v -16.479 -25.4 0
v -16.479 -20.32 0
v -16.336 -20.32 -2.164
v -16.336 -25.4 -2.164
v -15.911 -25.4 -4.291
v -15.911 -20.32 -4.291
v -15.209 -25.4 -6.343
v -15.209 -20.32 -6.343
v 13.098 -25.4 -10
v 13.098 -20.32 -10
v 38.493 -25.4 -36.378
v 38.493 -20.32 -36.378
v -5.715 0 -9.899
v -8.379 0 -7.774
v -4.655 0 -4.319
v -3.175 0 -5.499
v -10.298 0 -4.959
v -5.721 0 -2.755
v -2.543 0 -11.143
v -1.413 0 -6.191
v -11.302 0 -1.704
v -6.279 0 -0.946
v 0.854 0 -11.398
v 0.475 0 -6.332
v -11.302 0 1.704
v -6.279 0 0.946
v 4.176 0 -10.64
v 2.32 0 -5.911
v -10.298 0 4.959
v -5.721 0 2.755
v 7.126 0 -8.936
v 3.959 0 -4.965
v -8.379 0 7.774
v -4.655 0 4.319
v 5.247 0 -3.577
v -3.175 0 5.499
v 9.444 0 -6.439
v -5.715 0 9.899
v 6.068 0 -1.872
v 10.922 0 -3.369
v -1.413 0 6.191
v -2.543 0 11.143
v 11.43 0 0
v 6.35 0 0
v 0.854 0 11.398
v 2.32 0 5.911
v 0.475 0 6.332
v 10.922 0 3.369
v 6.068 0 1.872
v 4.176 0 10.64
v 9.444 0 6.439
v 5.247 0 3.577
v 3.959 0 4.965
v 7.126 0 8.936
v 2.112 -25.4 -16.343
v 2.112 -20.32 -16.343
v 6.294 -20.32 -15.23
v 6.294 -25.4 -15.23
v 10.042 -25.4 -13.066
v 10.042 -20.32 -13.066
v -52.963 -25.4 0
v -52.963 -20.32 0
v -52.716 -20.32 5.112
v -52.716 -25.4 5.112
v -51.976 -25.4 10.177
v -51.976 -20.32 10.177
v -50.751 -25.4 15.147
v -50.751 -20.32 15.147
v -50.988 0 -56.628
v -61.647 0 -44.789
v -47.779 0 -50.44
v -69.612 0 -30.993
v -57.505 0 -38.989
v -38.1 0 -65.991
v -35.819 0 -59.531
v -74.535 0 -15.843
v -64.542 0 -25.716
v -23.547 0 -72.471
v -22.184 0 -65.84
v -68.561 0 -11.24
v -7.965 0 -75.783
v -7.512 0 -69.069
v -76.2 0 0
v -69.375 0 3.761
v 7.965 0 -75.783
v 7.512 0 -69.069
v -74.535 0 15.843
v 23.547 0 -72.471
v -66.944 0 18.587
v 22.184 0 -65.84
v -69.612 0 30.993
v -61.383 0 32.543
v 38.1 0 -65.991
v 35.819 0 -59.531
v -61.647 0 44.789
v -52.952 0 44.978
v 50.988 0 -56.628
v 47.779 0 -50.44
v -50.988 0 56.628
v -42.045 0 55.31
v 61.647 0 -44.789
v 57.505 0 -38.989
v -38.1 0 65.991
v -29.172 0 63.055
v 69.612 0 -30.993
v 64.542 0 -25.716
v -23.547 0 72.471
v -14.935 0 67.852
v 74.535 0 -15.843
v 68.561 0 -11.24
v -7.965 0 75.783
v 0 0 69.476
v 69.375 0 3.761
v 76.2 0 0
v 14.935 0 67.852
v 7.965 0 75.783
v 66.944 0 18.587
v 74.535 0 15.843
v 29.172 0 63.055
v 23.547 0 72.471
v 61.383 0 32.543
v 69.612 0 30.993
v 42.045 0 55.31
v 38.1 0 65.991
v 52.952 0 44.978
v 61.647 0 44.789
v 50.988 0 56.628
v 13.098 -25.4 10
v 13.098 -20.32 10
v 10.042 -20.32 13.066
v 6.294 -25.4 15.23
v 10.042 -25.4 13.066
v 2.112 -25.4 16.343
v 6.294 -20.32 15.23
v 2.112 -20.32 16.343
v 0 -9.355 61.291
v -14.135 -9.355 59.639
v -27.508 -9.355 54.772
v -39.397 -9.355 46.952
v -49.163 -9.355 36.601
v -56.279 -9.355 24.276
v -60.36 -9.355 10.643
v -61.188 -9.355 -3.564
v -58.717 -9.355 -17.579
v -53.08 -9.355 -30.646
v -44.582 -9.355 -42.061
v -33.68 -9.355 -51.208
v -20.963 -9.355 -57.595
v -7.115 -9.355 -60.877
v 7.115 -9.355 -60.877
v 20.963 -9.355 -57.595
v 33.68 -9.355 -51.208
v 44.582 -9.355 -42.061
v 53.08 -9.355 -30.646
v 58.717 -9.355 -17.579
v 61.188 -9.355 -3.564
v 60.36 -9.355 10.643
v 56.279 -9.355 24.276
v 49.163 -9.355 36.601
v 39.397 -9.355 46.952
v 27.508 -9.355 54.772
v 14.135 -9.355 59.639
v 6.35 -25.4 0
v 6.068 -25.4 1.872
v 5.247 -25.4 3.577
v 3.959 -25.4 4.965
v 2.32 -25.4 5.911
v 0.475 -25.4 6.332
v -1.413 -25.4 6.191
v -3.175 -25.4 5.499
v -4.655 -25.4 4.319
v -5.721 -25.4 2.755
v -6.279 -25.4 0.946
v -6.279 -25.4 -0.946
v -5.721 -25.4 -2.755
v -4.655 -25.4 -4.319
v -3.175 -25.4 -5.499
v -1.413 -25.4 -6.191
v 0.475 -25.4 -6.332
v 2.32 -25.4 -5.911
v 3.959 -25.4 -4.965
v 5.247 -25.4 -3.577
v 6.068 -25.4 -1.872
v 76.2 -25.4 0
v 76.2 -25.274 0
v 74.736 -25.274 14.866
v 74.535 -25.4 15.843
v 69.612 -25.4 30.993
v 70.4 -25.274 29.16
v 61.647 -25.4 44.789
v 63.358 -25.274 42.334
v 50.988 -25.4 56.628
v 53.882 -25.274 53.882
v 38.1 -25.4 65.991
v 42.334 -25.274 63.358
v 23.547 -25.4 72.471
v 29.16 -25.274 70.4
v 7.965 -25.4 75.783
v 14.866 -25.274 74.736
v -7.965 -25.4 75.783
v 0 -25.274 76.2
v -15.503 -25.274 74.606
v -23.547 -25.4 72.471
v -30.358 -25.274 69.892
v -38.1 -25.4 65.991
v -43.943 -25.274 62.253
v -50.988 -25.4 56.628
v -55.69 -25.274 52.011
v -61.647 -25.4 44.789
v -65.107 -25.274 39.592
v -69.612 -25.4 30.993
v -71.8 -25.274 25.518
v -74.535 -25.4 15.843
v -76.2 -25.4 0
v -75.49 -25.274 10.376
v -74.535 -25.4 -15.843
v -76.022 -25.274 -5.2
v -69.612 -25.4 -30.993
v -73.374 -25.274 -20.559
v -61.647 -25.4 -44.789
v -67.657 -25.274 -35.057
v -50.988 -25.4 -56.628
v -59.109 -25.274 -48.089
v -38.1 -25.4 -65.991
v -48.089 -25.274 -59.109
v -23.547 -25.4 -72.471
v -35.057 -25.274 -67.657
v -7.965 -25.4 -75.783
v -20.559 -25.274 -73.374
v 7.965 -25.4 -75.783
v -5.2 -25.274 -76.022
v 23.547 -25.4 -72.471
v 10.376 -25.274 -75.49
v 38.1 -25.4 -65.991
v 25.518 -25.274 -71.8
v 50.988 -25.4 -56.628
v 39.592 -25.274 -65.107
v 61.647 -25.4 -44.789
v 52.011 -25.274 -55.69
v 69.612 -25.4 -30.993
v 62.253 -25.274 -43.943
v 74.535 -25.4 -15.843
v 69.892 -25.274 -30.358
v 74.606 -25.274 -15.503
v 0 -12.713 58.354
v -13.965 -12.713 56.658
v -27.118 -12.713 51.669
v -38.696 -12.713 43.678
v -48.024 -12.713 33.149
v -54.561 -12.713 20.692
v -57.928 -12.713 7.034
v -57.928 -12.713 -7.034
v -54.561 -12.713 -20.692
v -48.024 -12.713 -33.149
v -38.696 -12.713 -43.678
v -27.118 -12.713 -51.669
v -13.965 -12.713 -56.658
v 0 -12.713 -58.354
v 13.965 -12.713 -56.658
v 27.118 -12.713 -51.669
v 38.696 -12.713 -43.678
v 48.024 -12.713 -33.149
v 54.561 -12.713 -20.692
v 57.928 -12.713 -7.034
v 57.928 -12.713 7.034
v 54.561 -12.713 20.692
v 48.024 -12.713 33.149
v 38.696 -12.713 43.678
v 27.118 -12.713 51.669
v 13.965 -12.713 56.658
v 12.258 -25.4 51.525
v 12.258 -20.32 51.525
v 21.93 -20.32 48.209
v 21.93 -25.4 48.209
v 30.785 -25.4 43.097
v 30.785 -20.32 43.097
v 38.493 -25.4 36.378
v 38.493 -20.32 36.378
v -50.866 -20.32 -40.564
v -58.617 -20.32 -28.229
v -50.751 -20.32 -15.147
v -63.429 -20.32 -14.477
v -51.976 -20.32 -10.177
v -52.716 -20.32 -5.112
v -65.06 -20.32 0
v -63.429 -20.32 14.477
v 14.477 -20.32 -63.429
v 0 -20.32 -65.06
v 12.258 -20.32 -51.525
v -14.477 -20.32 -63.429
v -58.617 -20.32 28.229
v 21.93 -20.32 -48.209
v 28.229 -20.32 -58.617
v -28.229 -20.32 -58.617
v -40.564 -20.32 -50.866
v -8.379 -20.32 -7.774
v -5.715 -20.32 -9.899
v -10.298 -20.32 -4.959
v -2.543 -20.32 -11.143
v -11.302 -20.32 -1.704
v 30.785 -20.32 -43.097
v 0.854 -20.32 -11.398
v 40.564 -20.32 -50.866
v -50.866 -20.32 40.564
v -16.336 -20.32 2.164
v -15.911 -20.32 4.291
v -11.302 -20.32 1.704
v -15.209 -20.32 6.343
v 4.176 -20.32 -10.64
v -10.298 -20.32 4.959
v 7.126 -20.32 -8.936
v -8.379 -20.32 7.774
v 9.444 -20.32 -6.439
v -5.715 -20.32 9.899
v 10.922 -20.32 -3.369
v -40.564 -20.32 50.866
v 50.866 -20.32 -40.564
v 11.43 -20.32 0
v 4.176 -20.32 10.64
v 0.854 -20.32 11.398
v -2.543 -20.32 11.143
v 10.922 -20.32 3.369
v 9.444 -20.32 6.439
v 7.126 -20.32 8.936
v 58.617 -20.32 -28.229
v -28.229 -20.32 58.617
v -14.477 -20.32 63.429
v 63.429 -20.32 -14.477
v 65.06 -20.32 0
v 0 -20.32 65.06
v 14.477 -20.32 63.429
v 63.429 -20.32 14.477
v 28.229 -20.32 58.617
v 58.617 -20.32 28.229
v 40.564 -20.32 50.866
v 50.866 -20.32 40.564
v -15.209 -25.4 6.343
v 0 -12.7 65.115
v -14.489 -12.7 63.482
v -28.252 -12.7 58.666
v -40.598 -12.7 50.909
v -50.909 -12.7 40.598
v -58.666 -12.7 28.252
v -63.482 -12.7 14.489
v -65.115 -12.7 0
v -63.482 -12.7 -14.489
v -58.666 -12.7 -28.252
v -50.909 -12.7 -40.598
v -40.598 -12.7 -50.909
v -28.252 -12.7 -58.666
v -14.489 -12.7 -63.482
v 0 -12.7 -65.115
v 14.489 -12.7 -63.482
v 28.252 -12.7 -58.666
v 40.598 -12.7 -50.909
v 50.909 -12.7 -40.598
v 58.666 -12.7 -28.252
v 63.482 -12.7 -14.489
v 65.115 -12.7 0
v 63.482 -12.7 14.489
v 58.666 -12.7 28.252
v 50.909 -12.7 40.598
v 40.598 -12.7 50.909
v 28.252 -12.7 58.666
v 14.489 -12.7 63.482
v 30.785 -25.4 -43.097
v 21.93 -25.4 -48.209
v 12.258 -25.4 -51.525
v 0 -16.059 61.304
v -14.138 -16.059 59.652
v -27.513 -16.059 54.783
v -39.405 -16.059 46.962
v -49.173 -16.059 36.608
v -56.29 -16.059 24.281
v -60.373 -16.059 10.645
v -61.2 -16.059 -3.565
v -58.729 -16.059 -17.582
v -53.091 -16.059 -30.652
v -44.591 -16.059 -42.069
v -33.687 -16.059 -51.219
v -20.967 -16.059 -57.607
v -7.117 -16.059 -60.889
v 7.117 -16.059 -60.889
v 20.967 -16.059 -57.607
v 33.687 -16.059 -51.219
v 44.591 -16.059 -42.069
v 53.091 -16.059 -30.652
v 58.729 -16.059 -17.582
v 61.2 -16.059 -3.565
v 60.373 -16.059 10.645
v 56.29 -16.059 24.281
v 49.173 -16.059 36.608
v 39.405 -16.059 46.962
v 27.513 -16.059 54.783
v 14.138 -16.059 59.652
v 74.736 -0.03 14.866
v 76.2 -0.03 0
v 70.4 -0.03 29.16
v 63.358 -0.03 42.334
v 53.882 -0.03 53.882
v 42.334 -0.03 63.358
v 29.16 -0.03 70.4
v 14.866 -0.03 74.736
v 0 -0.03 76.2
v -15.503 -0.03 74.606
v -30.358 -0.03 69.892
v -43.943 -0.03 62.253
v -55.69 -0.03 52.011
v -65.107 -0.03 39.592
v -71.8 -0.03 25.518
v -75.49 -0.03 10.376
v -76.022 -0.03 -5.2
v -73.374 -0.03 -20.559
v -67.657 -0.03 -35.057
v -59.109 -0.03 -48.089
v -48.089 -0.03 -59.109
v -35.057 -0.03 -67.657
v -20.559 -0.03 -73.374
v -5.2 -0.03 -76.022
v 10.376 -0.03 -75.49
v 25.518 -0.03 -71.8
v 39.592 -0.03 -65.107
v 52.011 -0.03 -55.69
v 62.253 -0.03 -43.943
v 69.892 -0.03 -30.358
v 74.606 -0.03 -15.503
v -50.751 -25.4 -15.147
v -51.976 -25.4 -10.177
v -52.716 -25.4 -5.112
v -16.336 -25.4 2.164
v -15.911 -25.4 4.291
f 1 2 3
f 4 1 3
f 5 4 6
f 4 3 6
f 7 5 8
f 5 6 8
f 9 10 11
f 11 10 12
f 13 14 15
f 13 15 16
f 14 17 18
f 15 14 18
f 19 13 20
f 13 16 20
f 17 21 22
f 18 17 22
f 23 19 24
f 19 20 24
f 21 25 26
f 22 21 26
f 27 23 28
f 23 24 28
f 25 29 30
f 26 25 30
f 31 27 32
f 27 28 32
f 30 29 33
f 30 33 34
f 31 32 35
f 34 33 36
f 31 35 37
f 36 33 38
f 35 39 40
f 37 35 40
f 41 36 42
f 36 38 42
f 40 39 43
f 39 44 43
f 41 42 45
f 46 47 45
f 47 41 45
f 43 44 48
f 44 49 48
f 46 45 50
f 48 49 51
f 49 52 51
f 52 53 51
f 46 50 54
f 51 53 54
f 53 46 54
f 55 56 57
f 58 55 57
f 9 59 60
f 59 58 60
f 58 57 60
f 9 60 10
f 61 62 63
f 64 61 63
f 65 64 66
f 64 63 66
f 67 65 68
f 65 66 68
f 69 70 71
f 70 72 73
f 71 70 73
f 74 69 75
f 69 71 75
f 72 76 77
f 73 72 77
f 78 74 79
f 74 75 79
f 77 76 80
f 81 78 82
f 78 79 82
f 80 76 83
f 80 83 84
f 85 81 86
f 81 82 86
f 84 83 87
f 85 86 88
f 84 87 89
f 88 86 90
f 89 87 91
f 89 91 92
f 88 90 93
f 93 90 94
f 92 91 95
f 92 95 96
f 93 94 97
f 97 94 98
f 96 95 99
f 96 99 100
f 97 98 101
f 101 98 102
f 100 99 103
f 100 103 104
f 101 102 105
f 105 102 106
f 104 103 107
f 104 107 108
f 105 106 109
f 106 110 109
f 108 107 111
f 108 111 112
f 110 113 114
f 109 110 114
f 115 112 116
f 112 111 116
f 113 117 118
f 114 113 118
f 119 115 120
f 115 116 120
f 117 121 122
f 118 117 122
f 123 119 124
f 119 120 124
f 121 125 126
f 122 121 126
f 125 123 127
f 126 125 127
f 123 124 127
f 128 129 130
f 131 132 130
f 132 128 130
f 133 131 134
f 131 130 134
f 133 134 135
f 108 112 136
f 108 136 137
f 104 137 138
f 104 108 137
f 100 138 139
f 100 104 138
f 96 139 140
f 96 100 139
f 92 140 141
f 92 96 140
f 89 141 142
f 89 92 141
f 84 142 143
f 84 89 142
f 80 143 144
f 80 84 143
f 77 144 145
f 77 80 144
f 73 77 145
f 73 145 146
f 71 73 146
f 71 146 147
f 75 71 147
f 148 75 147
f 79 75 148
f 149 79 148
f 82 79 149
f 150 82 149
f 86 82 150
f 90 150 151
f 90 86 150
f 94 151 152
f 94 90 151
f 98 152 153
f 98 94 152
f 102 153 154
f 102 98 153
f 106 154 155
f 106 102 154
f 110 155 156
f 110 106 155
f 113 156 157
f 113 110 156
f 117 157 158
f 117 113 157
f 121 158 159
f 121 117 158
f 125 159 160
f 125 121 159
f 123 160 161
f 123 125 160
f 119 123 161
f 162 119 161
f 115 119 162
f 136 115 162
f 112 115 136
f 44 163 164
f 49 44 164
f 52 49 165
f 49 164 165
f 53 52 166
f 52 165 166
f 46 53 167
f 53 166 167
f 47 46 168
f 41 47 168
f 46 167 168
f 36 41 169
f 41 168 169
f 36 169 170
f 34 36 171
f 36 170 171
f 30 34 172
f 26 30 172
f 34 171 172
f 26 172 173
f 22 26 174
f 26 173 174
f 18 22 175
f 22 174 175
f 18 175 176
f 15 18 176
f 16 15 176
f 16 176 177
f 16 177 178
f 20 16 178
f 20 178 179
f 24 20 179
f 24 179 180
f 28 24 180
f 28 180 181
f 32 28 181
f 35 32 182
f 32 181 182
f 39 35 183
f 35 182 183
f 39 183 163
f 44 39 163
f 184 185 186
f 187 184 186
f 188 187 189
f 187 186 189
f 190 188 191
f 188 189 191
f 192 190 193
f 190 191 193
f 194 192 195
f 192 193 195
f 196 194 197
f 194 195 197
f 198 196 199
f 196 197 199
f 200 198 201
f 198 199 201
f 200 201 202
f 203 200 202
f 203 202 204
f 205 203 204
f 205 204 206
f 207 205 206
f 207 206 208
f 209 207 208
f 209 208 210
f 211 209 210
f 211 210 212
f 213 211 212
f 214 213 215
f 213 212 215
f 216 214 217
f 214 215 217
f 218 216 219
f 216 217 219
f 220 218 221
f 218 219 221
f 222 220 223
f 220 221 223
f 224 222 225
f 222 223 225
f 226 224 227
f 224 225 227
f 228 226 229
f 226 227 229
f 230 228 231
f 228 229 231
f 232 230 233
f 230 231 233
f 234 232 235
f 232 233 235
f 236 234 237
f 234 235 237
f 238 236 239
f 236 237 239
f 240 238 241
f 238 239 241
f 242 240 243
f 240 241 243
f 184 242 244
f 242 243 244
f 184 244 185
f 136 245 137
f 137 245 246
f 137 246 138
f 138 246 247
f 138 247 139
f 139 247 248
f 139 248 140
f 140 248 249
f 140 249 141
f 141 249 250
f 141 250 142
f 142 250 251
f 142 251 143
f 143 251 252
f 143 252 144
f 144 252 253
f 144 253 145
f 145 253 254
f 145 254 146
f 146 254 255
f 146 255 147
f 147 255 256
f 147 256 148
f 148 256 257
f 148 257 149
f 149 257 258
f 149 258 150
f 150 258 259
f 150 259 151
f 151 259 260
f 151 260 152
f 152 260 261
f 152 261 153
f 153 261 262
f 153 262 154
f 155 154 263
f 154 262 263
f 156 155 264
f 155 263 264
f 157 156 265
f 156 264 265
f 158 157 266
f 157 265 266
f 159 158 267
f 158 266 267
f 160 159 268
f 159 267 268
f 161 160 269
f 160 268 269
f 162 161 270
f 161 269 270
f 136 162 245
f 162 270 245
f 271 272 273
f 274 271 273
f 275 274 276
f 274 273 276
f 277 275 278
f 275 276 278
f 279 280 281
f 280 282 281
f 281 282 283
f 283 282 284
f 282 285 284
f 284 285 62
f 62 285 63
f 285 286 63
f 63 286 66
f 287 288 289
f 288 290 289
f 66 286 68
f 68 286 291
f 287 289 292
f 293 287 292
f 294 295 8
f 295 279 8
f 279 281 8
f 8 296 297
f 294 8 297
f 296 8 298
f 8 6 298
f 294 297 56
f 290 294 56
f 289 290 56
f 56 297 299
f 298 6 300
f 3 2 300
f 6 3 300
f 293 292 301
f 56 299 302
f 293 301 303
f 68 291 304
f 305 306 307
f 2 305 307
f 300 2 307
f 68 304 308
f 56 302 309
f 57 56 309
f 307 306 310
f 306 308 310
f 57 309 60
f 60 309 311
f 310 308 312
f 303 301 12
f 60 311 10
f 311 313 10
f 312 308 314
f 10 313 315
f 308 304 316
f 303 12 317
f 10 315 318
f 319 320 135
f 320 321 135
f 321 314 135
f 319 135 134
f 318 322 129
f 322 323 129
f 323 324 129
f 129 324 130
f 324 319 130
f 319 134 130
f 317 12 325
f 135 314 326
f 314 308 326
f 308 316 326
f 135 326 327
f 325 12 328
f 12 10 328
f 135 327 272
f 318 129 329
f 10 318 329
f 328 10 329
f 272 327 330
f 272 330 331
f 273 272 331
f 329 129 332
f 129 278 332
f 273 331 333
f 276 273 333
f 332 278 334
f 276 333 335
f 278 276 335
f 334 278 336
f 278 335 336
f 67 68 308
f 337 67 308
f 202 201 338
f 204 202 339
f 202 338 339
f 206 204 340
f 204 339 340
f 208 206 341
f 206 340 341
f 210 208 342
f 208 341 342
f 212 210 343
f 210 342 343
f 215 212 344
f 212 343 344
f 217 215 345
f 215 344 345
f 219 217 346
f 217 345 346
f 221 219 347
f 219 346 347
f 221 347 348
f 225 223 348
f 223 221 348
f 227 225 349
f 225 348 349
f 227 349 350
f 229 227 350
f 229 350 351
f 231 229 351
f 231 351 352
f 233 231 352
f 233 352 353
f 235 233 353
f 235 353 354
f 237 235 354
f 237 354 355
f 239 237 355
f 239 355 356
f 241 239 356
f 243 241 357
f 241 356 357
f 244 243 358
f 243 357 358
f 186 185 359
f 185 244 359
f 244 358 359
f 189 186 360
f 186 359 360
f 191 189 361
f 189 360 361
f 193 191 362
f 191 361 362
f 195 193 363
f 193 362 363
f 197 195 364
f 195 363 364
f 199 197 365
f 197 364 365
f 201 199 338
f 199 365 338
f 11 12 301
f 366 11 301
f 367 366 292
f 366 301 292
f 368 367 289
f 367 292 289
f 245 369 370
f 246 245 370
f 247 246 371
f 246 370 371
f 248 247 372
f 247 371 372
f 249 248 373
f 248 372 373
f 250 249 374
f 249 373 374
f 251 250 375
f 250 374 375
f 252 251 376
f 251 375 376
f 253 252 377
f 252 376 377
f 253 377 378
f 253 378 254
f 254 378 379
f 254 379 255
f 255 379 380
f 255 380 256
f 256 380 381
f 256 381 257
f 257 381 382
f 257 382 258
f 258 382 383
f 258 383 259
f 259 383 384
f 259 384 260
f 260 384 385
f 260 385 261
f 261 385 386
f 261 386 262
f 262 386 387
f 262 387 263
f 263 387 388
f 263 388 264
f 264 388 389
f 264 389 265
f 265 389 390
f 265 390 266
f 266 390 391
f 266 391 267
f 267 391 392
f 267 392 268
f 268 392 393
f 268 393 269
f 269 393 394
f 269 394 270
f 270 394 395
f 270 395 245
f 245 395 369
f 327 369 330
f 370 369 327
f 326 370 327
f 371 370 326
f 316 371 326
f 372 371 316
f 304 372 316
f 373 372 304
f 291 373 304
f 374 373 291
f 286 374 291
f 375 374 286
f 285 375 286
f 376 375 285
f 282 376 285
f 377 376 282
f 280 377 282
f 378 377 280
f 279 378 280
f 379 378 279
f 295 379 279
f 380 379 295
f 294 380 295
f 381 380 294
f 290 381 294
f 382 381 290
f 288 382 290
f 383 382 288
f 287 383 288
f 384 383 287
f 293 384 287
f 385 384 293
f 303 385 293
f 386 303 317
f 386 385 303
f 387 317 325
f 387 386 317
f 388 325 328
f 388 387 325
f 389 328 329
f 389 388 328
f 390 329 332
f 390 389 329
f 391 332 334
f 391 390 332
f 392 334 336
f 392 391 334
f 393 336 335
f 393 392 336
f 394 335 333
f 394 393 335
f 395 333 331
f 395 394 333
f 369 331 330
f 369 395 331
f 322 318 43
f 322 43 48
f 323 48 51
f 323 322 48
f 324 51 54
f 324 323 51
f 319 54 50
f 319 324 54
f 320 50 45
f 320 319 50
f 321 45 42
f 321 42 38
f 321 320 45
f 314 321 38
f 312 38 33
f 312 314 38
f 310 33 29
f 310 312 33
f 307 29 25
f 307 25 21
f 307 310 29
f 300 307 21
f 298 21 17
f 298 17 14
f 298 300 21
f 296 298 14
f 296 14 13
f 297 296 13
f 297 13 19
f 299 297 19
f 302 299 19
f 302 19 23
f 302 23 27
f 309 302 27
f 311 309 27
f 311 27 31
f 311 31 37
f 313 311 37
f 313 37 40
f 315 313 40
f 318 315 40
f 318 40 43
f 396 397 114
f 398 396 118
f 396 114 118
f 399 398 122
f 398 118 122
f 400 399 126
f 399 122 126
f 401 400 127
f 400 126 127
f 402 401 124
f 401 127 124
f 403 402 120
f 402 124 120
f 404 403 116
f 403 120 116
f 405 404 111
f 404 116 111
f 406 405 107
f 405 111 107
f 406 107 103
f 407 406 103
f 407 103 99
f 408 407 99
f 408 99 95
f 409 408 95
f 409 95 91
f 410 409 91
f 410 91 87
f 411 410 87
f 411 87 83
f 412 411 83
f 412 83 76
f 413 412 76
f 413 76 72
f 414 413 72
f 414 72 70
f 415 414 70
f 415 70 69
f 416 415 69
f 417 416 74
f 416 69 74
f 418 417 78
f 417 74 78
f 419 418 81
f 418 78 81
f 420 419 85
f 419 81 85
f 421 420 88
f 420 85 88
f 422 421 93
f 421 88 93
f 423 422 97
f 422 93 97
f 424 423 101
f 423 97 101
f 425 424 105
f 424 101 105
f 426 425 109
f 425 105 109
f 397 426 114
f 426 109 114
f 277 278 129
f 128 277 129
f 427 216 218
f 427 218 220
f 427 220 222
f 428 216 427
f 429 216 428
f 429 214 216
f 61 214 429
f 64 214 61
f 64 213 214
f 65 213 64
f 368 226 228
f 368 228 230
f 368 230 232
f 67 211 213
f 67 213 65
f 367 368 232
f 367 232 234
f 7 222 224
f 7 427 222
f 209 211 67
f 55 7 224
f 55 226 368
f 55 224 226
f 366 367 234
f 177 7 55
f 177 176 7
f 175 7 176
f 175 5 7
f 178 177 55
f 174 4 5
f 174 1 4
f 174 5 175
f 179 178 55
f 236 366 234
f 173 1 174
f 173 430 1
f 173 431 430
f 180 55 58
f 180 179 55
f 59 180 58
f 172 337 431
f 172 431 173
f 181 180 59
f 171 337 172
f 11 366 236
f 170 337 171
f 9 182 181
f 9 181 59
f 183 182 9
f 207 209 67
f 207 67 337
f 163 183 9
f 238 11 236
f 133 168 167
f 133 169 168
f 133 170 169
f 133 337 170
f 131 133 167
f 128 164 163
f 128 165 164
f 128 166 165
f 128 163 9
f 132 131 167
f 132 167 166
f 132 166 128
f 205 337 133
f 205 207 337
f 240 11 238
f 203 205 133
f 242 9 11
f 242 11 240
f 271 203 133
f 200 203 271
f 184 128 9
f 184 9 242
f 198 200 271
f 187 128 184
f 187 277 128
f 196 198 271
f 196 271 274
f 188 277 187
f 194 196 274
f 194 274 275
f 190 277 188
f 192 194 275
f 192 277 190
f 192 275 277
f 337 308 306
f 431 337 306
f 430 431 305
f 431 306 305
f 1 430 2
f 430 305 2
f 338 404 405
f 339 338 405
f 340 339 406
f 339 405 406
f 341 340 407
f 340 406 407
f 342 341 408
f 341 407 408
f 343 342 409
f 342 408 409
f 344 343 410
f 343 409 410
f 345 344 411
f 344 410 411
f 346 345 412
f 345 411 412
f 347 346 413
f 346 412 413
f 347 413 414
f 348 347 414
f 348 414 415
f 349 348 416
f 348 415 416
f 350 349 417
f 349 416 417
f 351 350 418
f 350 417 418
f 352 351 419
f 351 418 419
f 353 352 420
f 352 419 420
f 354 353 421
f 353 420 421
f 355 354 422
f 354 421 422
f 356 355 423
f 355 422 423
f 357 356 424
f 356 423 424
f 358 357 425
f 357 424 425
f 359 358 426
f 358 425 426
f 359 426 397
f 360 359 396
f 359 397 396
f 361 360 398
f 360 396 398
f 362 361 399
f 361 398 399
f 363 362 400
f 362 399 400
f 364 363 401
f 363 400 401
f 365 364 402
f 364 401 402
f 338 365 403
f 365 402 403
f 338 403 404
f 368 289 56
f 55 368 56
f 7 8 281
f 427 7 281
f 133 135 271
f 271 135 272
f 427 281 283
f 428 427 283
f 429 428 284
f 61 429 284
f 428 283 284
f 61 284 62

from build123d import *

# Parameters (mm, degrees)
F0_R     = 76.2
F1_DEPTH = 25.4
F4_R     = 6.35
F5_DEPTH = 25.4
F6_T     = 5.08
F8_DEPTH = 5.081


# Not quite as in the source:
# - a shell that OpenCascade refuses in one call is made with other operations: the cavity is built on its own and cut out


with BuildPart() as f1:
    # F0 (on Front) → F1 (new body)
    with BuildSketch(Plane.XZ):
        Circle(F0_R)
    extrude(amount=F1_DEPTH)

    # F2 (on Right) → F3 (revolve, cut)
    with BuildSketch(Plane.YZ):
        Polygon((-12.7, 65.1145875454), (0, 76.22641325), (-12.7, 76.22641325), (-25.3041852266, 76.22641325), align=None)
    revolve(axis=Axis((0, -25.4, 0), (0, -1, 0)), mode=Mode.SUBTRACT)

    # F4 (on face) → F5 (cut)
    with BuildSketch(Plane.XZ.offset(25.4)):
        Circle(F4_R)
    extrude(amount=-F5_DEPTH, mode=Mode.SUBTRACT)

    # F6: shell of thickness 5.08, made by hand


with BuildPart() as f6_core1:
    # F6_t2: copy of F1
    add(f1.part)

    # the walls: a layer under each face that stays
    f6_faces = [f6_core1.faces().sort_by_distance(p)[0] for p in [
        (-76.2, -0.0150942016, 0),
        (0, -6.3650942016, -70.6572937727),
        (-6.35, -12.7, 0),
        (0, -18.9871122894, -70.6572937727),
        (-50.8, -25.4, -50.8),
        (-76.2, -25.3371122894, 0),
    ]]
    thicken(f6_faces, amount=-F6_T, mode=Mode.SUBTRACT)

    # F6_s3 → F6_t4 (revolve, cut)
    with BuildSketch(Plane.YZ):
        Polygon((-12.6998566811, 65.1909254772), (-9.3549115607, 61.2913973417), (-12.712693419, 58.3535164942), (-16.0594203306, 61.3039845692), align=None)
    revolve(axis=Axis((0, -12.7, 0), (0, -1, 0)), mode=Mode.SUBTRACT)


with BuildPart() as f1_1:
    add(f1.part)

    # what is left inside the walls is the cavity
    f6_cavity = [f6_core1.part.solids().sort_by_distance(p)[0] for p in [
        (0, -0.0508, -23.158816),
    ]]
    add(f6_cavity, mode=Mode.SUBTRACT)

    # F7 (on face) → F8 (cut, through all)
    with BuildSketch(Plane(origin=(0, -20.32, 0), x_dir=(-1, 0, 0), z_dir=(0, 1, 0))):
        with BuildLine():
            ThreePointArc((50.750755659, -15.1466698341), (52.4068897458, -7.6536732487), (52.9628247644, 0))
            ThreePointArc((52.9628247644, 0), (52.4068897458, 7.6536732487), (50.750755659, 15.1466698341))
            Line((50.750755659, 15.1466698341), (15.2094055185, 6.3428222009))
            ThreePointArc((15.2094055185, 6.3428222009), (16.1584836664, 3.2343183675), (16.4789990503, 0))
            ThreePointArc((16.4789990503, 0), (16.1584836664, -3.2343183675), (15.2094055185, -6.3428222009))
            Line((15.2094055185, -6.3428222009), (50.750755659, -15.1466698341))
        make_face()
        with BuildLine():
            ThreePointArc((-38.4927786886, -36.3781087449), (-26.4814123822, -45.8671517021), (-12.2579769704, -51.524778579))
            Line((-12.2579769704, -51.524778579), (-2.1116576016, -16.343142656))
            ThreePointArc((-2.1116576016, -16.343142656), (-8.2394995251, -14.2712318065), (-13.0977479169, -10.000320455))
            Line((-13.0977479169, -10.000320455), (-38.4927786886, -36.3781087449))
        make_face()
        with BuildLine():
            Line((-2.1116576016, 16.343142656), (-12.2579769704, 51.524778579))
            ThreePointArc((-12.2579769704, 51.524778579), (-26.4814123822, 45.8671517021), (-38.4927786886, 36.3781087449))
            Line((-38.4927786886, 36.3781087449), (-13.0977479169, 10.000320455))
            ThreePointArc((-13.0977479169, 10.000320455), (-8.2394995251, 14.2712318065), (-2.1116576016, 16.343142656))
        make_face()
    extrude(amount=-F8_DEPTH, mode=Mode.SUBTRACT)


solid = f1_1.part
